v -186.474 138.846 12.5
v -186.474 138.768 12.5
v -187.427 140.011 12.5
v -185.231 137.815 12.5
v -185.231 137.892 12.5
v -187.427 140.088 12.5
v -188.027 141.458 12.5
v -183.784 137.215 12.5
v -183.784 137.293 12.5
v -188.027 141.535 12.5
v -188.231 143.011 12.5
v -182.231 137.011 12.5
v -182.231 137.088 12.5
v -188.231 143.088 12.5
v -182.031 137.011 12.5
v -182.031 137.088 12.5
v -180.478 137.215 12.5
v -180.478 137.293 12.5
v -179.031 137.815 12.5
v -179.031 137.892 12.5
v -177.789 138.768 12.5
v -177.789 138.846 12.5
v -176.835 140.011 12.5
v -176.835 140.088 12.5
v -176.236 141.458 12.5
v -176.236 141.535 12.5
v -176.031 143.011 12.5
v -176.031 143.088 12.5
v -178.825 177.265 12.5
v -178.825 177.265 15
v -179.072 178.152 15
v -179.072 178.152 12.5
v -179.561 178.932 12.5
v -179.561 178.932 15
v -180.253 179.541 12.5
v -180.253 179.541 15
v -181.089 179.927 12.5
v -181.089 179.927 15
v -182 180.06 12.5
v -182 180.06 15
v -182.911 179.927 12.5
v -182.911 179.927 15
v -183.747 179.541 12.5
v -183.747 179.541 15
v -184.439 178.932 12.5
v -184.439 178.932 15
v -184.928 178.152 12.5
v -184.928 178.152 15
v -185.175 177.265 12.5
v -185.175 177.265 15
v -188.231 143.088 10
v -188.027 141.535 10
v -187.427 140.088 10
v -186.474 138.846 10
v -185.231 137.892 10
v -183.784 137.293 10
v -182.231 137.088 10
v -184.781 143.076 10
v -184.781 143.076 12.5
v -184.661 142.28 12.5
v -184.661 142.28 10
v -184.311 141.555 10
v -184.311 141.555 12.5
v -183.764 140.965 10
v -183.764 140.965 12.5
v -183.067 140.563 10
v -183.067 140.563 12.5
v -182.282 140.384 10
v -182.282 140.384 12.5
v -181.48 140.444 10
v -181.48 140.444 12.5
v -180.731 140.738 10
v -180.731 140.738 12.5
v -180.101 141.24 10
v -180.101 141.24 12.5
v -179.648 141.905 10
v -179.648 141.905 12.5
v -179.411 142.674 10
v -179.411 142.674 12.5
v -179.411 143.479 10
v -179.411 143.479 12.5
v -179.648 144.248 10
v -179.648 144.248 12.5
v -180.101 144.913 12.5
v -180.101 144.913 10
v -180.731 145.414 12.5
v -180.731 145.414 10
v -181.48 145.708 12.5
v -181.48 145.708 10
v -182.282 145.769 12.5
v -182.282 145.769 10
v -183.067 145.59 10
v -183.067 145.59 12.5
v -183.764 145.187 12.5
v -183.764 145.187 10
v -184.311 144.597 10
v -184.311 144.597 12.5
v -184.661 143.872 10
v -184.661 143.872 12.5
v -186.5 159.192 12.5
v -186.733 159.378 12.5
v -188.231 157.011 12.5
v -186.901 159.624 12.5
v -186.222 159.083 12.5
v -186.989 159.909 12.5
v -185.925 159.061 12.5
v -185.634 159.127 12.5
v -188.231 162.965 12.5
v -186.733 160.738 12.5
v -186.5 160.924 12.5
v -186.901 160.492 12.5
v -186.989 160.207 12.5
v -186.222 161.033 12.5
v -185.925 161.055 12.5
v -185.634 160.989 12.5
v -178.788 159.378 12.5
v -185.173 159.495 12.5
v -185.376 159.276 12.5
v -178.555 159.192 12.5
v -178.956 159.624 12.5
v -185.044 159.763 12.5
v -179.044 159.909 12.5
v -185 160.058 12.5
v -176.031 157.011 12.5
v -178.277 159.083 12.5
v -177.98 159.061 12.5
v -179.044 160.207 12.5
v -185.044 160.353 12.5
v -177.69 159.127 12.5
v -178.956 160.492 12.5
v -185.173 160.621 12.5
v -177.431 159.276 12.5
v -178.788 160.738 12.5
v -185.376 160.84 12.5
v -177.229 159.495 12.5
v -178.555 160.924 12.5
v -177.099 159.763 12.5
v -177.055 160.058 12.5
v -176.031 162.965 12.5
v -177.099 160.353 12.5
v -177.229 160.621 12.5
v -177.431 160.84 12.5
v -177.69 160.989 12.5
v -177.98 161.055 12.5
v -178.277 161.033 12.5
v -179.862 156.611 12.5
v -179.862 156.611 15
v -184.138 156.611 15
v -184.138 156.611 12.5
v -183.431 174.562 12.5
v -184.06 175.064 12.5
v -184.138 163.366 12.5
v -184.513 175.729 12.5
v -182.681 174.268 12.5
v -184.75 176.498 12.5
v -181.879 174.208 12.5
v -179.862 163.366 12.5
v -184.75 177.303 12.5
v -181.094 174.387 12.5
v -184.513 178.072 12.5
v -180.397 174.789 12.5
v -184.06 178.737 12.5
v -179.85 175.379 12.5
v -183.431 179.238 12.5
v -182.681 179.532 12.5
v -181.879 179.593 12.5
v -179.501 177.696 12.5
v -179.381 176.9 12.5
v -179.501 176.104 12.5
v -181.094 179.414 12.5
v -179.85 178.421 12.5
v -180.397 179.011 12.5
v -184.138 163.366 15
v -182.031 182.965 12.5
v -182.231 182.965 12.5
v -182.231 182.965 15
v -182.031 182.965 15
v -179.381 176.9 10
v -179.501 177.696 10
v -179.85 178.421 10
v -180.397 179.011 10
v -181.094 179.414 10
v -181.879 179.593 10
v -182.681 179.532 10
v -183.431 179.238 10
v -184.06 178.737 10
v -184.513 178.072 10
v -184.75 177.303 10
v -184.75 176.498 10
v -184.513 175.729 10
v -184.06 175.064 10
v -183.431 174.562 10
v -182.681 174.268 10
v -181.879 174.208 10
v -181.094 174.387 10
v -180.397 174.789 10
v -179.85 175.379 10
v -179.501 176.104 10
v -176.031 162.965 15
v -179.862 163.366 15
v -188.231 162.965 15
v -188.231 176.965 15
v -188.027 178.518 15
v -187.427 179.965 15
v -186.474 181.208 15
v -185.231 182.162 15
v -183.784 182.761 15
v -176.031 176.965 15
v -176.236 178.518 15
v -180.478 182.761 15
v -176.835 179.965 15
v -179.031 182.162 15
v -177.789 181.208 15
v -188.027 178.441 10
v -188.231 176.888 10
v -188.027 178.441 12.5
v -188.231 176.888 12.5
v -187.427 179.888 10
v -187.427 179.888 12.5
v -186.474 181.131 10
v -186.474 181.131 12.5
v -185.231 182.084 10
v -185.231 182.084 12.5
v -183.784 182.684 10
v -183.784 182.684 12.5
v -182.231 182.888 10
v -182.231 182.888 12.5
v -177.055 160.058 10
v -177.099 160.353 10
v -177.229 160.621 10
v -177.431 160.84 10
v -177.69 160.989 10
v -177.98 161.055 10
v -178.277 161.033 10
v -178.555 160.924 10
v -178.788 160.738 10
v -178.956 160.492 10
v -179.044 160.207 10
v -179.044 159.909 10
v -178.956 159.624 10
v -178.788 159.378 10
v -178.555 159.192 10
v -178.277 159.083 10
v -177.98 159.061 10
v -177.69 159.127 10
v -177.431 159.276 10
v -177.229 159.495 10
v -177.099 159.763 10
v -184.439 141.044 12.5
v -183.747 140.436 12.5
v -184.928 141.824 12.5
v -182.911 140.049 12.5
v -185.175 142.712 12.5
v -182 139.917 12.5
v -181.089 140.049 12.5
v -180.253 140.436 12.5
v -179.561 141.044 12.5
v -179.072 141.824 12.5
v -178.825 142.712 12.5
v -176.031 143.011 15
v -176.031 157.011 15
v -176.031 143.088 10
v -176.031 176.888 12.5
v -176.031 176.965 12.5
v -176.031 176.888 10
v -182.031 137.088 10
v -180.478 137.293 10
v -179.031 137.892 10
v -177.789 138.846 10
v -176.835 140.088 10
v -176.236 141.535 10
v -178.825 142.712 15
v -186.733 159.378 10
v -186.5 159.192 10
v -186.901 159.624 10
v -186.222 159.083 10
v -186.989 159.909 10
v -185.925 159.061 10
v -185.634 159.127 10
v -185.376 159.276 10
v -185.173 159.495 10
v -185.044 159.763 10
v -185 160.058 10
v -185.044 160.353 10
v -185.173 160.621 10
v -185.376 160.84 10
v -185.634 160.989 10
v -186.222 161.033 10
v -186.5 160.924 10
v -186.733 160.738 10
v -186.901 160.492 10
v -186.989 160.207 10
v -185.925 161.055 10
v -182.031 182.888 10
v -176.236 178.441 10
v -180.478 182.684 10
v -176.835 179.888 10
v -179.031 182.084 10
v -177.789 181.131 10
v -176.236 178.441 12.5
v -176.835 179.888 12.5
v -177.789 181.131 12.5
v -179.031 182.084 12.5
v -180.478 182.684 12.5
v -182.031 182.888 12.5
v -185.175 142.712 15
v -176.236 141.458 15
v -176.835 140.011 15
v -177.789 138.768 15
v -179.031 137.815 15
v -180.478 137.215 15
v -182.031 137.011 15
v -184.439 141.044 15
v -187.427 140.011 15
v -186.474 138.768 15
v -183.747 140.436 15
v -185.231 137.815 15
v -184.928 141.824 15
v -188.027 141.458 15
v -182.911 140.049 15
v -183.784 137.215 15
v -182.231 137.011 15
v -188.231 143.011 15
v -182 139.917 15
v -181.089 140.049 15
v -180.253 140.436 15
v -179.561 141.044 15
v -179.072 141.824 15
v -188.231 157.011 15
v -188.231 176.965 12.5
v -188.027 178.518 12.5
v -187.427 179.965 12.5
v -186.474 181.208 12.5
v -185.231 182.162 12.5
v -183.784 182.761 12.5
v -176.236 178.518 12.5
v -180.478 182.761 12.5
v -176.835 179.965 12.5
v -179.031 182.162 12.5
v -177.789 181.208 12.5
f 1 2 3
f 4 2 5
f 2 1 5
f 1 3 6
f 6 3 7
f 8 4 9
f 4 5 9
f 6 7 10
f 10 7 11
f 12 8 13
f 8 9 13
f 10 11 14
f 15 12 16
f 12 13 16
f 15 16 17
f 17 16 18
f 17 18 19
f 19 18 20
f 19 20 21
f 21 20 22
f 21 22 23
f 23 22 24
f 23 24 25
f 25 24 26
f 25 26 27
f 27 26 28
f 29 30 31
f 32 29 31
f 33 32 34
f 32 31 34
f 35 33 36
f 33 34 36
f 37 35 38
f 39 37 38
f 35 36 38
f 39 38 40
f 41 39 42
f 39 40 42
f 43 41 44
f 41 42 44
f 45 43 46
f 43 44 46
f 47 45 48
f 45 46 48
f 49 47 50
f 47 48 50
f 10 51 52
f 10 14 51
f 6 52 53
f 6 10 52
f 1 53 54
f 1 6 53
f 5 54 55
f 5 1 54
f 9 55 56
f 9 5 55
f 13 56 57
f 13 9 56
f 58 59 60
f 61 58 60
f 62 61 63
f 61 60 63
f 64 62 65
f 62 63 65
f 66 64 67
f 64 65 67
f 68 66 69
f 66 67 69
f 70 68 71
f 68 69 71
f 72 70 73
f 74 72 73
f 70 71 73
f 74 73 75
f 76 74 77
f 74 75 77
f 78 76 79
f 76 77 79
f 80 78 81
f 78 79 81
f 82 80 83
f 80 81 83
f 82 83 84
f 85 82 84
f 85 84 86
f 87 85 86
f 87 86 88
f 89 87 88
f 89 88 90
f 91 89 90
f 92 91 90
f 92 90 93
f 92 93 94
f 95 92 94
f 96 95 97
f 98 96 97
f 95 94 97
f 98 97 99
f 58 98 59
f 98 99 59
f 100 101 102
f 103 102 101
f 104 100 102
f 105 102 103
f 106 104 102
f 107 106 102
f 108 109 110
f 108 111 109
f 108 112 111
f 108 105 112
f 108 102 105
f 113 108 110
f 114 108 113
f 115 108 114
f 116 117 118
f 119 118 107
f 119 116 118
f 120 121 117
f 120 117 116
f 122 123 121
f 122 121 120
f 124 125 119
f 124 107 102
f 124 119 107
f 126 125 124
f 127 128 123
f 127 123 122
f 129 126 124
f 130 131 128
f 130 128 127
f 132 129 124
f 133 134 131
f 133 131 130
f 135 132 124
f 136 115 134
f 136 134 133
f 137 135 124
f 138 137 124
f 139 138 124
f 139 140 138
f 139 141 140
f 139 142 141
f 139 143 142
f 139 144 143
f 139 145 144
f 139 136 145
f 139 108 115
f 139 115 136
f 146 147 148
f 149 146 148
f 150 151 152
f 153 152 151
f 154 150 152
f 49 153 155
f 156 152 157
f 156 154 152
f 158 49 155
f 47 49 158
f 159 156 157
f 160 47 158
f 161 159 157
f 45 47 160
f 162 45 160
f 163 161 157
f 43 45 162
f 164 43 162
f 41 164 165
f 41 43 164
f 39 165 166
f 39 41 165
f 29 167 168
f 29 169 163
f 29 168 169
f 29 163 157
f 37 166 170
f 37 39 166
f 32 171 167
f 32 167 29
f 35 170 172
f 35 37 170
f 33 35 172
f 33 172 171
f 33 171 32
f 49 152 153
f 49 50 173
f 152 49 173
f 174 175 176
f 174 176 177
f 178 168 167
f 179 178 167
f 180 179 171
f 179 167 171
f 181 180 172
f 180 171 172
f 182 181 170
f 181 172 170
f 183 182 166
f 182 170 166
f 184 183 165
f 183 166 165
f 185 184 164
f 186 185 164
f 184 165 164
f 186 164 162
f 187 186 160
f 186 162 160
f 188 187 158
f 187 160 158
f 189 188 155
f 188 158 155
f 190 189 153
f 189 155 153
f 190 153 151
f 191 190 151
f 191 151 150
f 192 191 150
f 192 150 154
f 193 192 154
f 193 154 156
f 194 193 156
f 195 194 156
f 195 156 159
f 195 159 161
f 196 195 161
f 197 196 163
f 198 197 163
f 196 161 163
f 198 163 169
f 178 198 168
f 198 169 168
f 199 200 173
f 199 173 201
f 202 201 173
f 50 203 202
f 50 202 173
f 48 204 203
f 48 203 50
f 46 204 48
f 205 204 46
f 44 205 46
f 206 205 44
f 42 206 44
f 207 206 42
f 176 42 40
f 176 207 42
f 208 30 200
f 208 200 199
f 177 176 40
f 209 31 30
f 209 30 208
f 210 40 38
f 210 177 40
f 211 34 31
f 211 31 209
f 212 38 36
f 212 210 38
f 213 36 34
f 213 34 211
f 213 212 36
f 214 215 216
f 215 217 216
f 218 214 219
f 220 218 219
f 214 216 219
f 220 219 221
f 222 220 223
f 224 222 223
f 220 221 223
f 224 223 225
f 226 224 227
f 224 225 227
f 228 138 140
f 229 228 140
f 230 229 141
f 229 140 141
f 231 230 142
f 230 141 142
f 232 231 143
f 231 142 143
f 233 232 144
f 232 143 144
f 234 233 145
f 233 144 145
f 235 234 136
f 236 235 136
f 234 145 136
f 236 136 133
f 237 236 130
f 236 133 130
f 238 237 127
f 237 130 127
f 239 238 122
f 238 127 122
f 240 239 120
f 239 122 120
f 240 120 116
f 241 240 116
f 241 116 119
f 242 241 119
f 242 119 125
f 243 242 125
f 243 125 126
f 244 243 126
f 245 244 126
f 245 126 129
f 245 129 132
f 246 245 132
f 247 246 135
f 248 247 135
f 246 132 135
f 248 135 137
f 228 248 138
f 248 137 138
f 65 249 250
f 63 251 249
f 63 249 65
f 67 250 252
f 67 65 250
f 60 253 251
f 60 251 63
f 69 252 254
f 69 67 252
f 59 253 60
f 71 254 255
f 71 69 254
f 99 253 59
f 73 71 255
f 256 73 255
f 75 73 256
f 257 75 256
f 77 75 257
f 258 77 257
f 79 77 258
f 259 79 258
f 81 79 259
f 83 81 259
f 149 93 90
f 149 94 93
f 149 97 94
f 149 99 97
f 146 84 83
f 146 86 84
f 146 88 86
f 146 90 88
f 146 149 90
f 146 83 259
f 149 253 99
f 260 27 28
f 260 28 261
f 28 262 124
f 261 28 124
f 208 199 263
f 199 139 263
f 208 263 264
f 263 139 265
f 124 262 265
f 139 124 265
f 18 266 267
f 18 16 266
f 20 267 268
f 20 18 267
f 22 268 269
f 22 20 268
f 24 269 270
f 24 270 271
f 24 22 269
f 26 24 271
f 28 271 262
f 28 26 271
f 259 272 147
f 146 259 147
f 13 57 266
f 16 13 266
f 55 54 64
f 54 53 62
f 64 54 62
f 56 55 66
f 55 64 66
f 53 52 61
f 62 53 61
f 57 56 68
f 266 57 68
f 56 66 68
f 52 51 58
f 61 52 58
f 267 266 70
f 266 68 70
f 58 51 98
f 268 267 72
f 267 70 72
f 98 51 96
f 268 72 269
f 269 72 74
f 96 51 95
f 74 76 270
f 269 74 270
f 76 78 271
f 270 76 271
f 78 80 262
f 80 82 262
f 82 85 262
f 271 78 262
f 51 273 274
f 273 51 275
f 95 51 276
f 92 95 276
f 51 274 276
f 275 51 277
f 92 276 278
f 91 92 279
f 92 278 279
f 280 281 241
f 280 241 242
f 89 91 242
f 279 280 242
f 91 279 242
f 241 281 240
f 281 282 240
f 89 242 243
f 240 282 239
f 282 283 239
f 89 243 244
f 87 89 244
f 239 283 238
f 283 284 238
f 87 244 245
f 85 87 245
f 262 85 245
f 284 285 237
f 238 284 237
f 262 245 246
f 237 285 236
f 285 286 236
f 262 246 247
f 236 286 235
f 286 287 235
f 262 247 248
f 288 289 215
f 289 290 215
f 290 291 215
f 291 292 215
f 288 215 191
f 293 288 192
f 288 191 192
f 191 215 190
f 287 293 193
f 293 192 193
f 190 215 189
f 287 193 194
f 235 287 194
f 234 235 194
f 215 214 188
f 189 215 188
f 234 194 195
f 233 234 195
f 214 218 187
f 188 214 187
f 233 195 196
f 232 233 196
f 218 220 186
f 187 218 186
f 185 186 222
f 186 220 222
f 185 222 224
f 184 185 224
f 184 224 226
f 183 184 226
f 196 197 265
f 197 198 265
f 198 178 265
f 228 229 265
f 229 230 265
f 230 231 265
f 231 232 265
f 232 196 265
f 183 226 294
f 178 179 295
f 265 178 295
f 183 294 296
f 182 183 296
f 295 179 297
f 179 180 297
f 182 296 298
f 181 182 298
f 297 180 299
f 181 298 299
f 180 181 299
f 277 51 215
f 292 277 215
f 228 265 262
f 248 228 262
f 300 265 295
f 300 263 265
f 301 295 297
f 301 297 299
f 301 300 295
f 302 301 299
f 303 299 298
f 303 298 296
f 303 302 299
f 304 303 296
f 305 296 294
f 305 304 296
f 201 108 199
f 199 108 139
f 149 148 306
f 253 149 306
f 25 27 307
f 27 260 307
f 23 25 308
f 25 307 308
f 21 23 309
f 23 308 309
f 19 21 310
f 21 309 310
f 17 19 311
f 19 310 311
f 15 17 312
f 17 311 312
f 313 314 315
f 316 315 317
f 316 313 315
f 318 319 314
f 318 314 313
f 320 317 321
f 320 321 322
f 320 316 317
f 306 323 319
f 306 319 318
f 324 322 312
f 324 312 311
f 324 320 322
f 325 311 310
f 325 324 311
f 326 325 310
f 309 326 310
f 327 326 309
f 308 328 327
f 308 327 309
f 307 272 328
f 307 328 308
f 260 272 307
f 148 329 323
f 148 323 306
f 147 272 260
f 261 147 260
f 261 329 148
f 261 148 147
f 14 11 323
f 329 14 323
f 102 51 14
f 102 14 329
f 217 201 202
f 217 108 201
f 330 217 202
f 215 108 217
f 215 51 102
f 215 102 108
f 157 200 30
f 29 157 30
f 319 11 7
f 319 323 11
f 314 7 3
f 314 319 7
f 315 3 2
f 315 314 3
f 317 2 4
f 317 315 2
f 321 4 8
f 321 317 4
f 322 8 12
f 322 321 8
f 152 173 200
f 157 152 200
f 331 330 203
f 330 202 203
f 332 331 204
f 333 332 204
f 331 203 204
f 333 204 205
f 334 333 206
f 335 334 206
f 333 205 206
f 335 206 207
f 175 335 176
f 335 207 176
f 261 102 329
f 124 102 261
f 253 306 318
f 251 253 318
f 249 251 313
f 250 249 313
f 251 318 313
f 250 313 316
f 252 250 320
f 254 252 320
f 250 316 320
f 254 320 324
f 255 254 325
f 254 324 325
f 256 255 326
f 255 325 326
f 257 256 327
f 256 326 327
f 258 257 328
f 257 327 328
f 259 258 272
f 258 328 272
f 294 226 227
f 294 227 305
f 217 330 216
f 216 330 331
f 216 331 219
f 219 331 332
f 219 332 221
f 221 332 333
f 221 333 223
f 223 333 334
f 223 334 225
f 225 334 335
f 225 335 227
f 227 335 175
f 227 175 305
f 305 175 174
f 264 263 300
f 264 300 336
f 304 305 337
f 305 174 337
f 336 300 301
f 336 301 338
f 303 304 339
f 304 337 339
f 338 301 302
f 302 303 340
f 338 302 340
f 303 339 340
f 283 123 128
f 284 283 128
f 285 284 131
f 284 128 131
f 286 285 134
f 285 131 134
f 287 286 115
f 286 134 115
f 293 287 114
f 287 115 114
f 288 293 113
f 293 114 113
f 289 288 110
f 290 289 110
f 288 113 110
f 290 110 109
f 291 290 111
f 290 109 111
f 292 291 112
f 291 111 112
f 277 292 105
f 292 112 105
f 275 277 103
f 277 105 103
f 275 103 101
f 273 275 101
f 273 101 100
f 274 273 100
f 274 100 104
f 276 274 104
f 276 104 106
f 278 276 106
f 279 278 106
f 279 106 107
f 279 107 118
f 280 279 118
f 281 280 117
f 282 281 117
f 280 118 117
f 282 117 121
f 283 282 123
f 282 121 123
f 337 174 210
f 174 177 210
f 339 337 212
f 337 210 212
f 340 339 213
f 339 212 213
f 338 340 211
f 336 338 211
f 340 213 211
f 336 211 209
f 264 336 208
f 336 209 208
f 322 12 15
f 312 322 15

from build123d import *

# Parameters (mm, degrees)
SKETCH1_W           = 12.2
SKETCH1_H           = 45.8
BOSS_EXTRUDE1_DEPTH = 2.5
FILLET1_R           = 6
SKETCH2_W           = 12.2
SKETCH2_H           = 20
BOSS_EXTRUDE2_DEPTH = 2.5
FILLET2_R           = 6
SKETCH3_R           = 1
CUT_EXTRUDE1_DEPTH  = 2.5
CUT_EXTRUDE2_DEPTH  = 2.5
SKETCH5_R           = 2.7
CUT_EXTRUDE3_DEPTH  = 2.5


with BuildPart() as part:
    # Sketch1 → Boss-Extrude1 (new body)
    with BuildSketch(Plane.XY.offset(10)):
        with Locations((-182.131179691, 159.988166791)):
            Rectangle(SKETCH1_W, SKETCH1_H)
    extrude(amount=BOSS_EXTRUDE1_DEPTH)

    # Fillet1
    fillet1_edges = [part.edges().sort_by_distance(p)[0] for p in [
        (-188.231179691, 182.888166791, 11.25),
        (-176.031179691, 182.888166791, 11.25),
        (-176.031179691, 137.088166791, 11.25),
        (-188.231179691, 137.088166791, 11.25),
    ]]
    fillet(fillet1_edges, radius=FILLET1_R)

    # Sketch2 → Boss-Extrude2 (add)
    with BuildSketch(Plane.XY.offset(12.5)):
        with Locations((-182.131179691, 172.965455297)):
            Rectangle(SKETCH2_W, SKETCH2_H)
        with Locations((-182.131179691, 147.010878284)):
            Rectangle(SKETCH2_W, SKETCH2_H)
    extrude(amount=BOSS_EXTRUDE2_DEPTH)

    # Fillet2
    fillet2_edges = [part.edges().sort_by_distance(p)[0] for p in [
        (-176.031179691, 182.965455297, 13.75),
        (-188.231179691, 182.965455297, 13.75),
        (-176.031179691, 137.010878284, 13.75),
        (-188.231179691, 137.010878284, 13.75),
    ]]
    fillet(fillet2_edges, radius=FILLET2_R)

    # Sketch3 → Cut-Extrude1 (cut)
    with BuildSketch(Plane.XY.offset(12.5)):
        with Locations((-185.999682024, 160.057912714)):
            Circle(SKETCH3_R)
        with Locations((-178.054871456, 160.057912714)):
            Circle(SKETCH3_R)
    extrude(amount=-CUT_EXTRUDE1_DEPTH, mode=Mode.SUBTRACT)

    # Sketch4 → Cut-Extrude2 (cut)
    with BuildSketch(Plane.XY.offset(15)):
        with BuildLine():
            Line((-184.138427734, 163.365707397), (-179.861572266, 163.365707397))
            Line((-179.861572266, 163.365707397), (-178.824890137, 177.264755249))
            ThreePointArc((-178.824890137, 177.264755249), (-182, 180.059517658), (-185.175109863, 177.264755249))
            Line((-185.175109863, 177.264755249), (-184.138427734, 163.365707397))
        make_face()
        with BuildLine():
            Line((-184.138427734, 156.610626184), (-185.175109863, 142.711578332))
            ThreePointArc((-185.175109863, 142.711578332), (-182, 139.916815923), (-178.824890137, 142.711578332))
            Line((-178.824890137, 142.711578332), (-179.861572266, 156.610626184))
            Line((-179.861572266, 156.610626184), (-184.138427734, 156.610626184))
        make_face()
    extrude(amount=-CUT_EXTRUDE2_DEPTH, mode=Mode.SUBTRACT)

    # Sketch5 → Cut-Extrude3 (cut)
    with BuildSketch(Plane.XY.offset(12.5)):
        with Locations((-182.080577922, 176.90016829)):
            Circle(SKETCH5_R)
        with Locations(Location((-182.080577922, 143.076165291, 0), (0, 0, 180))):
            Circle(SKETCH5_R)
    extrude(amount=-CUT_EXTRUDE3_DEPTH, mode=Mode.SUBTRACT)


solid = part.part
